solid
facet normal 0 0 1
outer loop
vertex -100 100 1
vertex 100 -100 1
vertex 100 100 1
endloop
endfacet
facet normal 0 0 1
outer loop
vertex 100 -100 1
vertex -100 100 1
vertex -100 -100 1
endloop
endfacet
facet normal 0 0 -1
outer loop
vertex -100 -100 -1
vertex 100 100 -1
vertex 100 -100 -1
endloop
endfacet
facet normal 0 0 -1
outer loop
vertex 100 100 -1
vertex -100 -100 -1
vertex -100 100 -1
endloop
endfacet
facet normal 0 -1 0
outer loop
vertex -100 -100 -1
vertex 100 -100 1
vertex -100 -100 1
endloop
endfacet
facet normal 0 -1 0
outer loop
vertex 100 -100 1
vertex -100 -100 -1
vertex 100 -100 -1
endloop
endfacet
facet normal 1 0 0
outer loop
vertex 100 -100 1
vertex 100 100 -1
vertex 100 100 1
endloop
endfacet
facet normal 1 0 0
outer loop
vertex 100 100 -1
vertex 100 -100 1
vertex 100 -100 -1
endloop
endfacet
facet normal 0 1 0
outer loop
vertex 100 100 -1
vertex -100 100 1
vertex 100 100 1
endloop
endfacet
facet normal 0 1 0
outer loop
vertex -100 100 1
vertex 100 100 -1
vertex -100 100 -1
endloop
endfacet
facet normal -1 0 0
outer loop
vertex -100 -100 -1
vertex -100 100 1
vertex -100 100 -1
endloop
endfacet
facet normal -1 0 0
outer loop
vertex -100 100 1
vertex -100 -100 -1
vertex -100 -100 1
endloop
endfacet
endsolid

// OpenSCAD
// Parameters
sheet_L = 200; //[100:400:1]
sheet_W = 200; //[100:400:1]
sheet_T = 2;   //[1:6:0.5]

// Robust thickness to avoid blank renders (e.g., too-thin for viewer precision)
min_T = 0.5;
T = max(sheet_T, min_T);

// Geometry (one connected solid)
color([0.85, 0.85, 0.8])
    cube([sheet_L, sheet_W, T], center=true);
